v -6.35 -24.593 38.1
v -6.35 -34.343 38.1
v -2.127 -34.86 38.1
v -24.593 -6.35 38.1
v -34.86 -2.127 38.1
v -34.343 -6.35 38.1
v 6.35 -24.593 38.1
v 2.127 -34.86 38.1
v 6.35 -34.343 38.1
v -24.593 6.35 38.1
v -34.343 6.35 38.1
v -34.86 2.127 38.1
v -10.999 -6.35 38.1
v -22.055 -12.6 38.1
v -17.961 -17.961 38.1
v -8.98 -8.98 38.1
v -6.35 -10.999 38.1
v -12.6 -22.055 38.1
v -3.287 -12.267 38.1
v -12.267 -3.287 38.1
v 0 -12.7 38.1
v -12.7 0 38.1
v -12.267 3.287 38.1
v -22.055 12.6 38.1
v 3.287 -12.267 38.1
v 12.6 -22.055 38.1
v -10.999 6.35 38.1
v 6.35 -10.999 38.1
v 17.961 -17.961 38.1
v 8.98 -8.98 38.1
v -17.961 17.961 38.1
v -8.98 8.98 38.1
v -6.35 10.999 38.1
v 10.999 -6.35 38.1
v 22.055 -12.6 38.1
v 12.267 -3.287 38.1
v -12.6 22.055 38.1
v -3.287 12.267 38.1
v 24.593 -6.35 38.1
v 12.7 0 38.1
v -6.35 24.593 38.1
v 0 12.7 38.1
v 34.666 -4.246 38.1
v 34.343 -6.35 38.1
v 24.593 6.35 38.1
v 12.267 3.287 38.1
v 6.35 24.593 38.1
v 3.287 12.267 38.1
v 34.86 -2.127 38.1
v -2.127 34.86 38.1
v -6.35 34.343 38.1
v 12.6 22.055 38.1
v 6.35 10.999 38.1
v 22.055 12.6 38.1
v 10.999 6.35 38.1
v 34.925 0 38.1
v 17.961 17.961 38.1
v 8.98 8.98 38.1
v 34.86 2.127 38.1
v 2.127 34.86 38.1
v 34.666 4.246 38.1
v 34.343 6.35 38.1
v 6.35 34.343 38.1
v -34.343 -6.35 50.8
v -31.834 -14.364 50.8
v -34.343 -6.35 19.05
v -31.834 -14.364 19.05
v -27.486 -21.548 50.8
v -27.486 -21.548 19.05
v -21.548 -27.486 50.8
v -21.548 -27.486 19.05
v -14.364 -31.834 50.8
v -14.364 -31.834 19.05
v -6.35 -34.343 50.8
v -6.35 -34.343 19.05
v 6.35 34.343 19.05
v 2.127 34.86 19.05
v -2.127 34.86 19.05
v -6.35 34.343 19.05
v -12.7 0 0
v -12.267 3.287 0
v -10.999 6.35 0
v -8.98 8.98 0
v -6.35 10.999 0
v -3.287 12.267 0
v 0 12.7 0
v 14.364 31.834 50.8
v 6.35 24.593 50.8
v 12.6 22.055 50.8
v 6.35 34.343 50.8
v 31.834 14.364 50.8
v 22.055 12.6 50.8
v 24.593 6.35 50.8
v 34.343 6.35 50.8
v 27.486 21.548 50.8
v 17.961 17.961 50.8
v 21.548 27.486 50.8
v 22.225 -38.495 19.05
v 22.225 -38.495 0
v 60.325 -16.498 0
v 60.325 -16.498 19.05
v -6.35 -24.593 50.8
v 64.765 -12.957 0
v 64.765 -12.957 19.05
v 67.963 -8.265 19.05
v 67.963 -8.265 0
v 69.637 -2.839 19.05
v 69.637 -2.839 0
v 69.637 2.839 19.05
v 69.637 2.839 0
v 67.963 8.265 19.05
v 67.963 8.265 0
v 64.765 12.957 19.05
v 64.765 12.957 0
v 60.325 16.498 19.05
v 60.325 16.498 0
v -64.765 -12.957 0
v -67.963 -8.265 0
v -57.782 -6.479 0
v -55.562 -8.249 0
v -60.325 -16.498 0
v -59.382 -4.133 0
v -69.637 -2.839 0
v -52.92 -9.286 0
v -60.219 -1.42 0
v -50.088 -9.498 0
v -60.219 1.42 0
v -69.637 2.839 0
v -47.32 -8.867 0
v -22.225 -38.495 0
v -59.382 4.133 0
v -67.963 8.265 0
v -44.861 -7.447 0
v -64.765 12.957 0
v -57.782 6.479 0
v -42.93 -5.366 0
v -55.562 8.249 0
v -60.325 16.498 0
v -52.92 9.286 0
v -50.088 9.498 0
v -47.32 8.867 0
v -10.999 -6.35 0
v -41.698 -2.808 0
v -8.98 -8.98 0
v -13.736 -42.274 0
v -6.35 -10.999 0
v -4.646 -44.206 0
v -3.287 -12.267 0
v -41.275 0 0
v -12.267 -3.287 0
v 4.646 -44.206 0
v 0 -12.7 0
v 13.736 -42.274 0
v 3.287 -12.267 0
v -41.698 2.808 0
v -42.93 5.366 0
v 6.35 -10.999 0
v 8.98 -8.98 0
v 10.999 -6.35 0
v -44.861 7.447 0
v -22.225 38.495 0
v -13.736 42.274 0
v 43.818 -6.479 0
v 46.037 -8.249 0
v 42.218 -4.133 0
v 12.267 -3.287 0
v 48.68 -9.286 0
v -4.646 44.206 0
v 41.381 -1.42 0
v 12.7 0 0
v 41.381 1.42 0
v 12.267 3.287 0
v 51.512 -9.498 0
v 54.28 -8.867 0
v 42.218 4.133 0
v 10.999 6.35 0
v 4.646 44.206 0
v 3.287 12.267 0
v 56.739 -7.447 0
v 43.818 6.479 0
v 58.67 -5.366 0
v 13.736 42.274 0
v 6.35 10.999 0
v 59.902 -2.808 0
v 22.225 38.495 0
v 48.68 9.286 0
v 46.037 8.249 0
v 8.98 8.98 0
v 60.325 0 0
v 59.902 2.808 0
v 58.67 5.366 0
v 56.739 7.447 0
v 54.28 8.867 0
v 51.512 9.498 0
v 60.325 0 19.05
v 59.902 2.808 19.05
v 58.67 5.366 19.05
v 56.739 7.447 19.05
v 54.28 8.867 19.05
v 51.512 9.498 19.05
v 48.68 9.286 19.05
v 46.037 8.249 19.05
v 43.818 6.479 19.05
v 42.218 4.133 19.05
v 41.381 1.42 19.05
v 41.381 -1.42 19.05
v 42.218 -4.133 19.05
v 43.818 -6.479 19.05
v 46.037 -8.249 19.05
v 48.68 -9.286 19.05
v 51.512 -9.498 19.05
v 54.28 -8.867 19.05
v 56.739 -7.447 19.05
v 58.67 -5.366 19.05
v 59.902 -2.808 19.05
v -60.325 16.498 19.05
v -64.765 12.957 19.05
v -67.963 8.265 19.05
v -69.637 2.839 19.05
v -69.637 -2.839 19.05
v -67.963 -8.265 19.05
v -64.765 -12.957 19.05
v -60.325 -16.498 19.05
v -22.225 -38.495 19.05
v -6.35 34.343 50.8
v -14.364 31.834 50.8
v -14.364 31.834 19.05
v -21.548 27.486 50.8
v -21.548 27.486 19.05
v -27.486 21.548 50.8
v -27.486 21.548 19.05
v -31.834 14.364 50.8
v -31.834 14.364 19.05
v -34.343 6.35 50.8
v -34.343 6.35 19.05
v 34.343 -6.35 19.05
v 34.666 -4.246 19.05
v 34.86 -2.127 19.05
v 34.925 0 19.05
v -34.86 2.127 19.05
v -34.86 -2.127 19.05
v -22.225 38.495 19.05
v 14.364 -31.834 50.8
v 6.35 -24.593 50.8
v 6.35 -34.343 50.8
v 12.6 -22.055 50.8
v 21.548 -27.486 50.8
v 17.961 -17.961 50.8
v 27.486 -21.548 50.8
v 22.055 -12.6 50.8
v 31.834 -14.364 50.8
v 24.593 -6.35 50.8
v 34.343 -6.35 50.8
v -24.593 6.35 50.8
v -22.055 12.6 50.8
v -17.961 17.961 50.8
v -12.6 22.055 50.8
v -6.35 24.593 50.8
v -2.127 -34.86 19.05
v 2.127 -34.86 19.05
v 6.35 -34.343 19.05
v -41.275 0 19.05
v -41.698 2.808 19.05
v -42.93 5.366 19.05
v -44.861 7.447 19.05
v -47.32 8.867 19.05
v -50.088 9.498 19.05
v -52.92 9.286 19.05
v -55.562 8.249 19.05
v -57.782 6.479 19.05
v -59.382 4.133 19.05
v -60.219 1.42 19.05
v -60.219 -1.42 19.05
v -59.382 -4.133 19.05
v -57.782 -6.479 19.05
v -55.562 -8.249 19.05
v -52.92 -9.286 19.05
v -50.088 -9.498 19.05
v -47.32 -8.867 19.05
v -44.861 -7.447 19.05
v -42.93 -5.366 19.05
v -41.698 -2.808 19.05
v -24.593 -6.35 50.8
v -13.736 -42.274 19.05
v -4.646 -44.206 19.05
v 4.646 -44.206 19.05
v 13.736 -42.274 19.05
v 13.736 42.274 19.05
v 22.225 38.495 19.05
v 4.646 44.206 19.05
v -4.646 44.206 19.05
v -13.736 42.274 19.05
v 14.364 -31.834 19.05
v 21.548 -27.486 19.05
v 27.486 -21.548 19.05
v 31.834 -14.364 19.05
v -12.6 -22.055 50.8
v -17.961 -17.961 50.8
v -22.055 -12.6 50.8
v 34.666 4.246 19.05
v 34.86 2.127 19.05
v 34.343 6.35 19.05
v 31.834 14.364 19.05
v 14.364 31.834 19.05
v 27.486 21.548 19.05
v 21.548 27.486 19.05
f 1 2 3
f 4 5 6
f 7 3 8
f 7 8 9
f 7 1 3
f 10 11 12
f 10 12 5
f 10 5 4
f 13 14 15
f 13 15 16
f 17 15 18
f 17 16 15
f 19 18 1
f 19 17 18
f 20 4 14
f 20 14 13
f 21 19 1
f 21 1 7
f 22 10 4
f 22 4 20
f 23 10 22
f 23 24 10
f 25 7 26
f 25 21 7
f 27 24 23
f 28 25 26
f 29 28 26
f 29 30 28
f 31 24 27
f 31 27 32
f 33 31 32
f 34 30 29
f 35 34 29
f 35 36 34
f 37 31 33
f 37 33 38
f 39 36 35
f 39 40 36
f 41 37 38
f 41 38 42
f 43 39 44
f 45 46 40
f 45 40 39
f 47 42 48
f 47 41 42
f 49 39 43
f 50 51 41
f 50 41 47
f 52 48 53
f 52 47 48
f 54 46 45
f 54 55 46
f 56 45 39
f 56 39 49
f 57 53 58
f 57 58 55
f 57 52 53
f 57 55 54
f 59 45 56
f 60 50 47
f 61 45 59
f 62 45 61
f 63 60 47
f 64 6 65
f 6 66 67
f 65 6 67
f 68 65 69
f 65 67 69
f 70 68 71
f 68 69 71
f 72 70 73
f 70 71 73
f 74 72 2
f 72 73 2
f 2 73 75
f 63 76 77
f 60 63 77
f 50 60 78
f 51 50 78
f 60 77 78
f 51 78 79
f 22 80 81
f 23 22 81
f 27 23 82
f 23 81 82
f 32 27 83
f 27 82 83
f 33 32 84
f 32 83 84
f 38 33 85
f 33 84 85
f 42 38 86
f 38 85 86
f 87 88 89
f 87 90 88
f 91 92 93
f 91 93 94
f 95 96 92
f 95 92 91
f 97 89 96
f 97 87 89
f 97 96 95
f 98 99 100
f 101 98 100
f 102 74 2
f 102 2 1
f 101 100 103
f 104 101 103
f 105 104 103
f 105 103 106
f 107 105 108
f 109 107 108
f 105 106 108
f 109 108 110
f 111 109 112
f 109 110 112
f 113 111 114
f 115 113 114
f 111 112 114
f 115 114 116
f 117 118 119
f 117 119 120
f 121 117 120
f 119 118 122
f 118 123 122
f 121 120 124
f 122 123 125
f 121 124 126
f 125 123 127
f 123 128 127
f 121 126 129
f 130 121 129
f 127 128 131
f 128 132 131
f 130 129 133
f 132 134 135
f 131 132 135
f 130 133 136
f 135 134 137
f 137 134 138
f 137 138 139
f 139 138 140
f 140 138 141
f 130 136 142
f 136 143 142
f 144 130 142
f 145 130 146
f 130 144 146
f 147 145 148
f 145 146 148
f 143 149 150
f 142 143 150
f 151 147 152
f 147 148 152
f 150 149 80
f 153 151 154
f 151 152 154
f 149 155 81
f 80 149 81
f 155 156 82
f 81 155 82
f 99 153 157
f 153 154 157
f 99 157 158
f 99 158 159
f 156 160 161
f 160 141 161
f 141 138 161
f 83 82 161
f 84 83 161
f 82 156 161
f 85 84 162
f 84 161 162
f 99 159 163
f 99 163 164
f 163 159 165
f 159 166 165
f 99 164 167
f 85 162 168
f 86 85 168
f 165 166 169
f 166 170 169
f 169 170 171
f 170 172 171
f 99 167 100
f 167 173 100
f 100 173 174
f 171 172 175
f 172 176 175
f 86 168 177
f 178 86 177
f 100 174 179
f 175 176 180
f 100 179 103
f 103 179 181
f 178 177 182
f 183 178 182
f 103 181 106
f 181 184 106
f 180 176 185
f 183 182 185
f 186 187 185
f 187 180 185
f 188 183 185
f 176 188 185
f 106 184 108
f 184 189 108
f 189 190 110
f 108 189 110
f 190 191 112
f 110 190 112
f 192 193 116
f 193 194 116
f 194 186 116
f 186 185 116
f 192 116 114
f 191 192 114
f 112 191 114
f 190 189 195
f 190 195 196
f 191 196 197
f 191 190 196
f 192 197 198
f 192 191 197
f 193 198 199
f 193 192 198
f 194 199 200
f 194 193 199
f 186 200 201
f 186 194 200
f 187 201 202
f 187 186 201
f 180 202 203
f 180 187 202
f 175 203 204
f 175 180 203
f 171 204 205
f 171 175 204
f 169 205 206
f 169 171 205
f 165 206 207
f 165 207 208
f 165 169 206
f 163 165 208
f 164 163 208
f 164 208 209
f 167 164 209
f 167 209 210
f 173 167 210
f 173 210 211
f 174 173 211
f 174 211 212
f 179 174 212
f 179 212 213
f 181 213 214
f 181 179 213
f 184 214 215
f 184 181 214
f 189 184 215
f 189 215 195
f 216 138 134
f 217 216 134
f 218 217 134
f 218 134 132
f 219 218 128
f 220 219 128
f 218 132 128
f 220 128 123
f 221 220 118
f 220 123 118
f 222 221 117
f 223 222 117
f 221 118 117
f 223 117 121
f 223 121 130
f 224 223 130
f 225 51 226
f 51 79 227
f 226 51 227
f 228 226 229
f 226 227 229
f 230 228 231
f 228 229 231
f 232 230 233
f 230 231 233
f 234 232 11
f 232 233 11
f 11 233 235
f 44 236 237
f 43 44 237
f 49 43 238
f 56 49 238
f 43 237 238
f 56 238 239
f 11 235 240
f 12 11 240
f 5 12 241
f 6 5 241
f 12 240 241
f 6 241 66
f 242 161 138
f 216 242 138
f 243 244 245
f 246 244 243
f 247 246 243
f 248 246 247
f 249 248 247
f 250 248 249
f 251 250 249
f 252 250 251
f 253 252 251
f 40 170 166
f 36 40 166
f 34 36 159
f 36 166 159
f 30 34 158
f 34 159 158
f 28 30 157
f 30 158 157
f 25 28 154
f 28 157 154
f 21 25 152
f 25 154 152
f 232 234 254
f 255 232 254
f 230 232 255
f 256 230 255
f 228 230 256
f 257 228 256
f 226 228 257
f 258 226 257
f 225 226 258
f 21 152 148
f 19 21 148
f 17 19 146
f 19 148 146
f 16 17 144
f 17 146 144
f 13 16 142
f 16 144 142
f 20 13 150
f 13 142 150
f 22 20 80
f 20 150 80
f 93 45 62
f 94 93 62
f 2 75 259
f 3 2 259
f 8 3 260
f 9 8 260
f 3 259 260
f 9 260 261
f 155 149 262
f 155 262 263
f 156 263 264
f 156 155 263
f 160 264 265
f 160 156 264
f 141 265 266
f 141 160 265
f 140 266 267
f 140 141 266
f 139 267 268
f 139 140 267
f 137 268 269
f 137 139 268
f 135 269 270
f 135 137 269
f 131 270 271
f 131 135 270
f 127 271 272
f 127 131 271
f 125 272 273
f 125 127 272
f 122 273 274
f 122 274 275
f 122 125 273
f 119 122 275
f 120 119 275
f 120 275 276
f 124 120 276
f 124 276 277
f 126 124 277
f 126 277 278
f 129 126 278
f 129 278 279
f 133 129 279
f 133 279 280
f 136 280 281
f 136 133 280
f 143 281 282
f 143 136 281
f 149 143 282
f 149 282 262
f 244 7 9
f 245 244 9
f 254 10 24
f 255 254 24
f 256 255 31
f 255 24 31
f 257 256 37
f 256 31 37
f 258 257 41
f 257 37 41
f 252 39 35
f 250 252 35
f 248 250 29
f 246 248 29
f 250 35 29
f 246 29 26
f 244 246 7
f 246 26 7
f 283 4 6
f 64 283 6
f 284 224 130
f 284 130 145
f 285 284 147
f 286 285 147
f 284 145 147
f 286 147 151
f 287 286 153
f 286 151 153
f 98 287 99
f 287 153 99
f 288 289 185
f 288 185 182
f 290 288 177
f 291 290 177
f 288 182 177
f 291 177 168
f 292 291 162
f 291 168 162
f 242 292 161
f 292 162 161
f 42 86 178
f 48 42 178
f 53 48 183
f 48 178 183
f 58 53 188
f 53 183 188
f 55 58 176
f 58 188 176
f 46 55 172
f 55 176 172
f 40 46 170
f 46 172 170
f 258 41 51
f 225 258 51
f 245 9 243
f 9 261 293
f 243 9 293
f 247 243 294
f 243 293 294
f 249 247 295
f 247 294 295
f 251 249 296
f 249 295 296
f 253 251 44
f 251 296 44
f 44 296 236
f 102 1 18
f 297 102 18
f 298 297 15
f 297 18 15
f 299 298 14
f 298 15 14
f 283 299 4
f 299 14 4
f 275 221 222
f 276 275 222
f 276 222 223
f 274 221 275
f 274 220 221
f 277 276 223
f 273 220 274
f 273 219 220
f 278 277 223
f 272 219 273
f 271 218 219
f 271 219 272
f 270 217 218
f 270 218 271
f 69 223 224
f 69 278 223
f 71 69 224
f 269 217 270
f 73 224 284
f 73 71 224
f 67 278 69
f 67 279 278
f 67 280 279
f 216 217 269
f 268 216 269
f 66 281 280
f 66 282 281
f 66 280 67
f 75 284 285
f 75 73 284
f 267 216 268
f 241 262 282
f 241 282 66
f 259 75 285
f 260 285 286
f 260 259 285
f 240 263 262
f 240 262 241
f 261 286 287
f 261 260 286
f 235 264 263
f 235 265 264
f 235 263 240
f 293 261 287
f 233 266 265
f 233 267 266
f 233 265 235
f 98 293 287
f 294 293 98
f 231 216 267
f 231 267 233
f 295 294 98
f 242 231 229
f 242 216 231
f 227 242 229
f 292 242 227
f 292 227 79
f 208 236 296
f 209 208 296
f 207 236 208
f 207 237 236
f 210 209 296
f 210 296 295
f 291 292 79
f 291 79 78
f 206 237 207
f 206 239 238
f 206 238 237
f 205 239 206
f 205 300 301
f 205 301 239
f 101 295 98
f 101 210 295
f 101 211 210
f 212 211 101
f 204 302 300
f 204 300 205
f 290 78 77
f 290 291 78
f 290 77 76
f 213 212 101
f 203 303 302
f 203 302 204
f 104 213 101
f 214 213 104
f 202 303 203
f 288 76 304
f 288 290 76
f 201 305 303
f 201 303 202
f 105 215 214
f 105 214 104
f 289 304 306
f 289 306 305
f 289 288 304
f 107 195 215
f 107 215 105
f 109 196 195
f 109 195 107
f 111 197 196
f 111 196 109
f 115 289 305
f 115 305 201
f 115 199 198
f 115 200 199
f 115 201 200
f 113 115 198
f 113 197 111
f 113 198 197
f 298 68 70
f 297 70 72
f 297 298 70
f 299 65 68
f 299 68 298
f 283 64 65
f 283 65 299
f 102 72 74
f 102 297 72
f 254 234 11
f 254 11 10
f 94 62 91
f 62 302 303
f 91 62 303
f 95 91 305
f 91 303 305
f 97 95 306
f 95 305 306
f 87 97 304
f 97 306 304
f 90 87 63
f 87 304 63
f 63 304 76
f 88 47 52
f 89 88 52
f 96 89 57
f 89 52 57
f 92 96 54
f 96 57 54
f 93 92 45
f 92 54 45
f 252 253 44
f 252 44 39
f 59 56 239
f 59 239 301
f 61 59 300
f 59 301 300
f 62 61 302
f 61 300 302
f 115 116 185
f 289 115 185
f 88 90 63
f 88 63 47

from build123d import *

# Parameters (mm, degrees)
F0_R     = 9.525
F1_DEPTH = 19.05
F2_DEPTH = 50.8
F3_DEPTH = 38.1


with BuildPart() as f1:
    # F0 (on Top) → F1 (new body)
    with BuildSketch(Plane.XY):
        with BuildLine():
            Line((-60.325, -16.4977839421), (-22.225, -38.4948291982))
            ThreePointArc((-22.225, -38.4948291982), (0, -44.45), (22.225, -38.4948291982))
            Line((22.225, -38.4948291982), (60.325, -16.4977839421))
            ThreePointArc((60.325, -16.4977839421), (69.85, 0), (60.325, 16.4977839421))
            Line((60.325, 16.4977839421), (22.225, 38.4948291982))
            ThreePointArc((22.225, 38.4948291982), (0, 44.45), (-22.225, 38.4948291982))
            Line((-22.225, 38.4948291982), (-60.325, 16.4977839421))
            ThreePointArc((-60.325, 16.4977839421), (-69.85, 0), (-60.325, -16.4977839421))
        make_face()
        with Locations((-50.8, 0)):
            Circle(F0_R, mode=Mode.SUBTRACT)
        with BuildLine():
            ThreePointArc((6.35, 34.3428758988), (24.6957043329, 24.6957043329), (34.3428758988, 6.35))
            ThreePointArc((34.3428758988, 6.35), (34.7791644937, 3.1883133656), (34.925, 0))
            ThreePointArc((34.925, 0), (34.7791644937, -3.1883133656), (34.3428758988, -6.35))
            ThreePointArc((34.3428758988, -6.35), (24.6957043329, -24.6957043329), (6.35, -34.3428758988))
            ThreePointArc((6.35, -34.3428758988), (0, -34.925), (-6.35, -34.3428758988))
            ThreePointArc((-6.35, -34.3428758988), (-24.6957043329, -24.6957043329), (-34.3428758988, -6.35))
            ThreePointArc((-34.3428758988, -6.35), (-34.925, 0), (-34.3428758988, 6.35))
            ThreePointArc((-34.3428758988, 6.35), (-24.6957043329, 24.6957043329), (-6.35, 34.3428758988))
            ThreePointArc((-6.35, 34.3428758988), (0, 34.925), (6.35, 34.3428758988))
        make_face(mode=Mode.SUBTRACT)
        with Locations((50.8, 0)):
            Circle(F0_R, mode=Mode.SUBTRACT)
    extrude(amount=F1_DEPTH)

    # F0 (on Top) → F2 (join)
    with BuildSketch(Plane.XY):
        with BuildLine():
            ThreePointArc((-24.5934442484, 6.35), (-17.9605122421, 17.9605122421), (-6.35, 24.5934442484))
            Line((-6.35, 24.5934442484), (-6.35, 34.3428758988))
            ThreePointArc((-6.35, 34.3428758988), (-24.6957043329, 24.6957043329), (-34.3428758988, 6.35))
            Line((-34.3428758988, 6.35), (-30.5676609278, 6.35))
            Line((-30.5676609278, 6.35), (-24.5934442484, 6.35))
        make_face()
        with BuildLine():
            Line((-6.35, -34.3428758988), (-6.35, -24.5934442484))
            ThreePointArc((-6.35, -24.5934442484), (-17.9605122421, -17.9605122421), (-24.5934442484, -6.35))
            Line((-24.5934442484, -6.35), (-34.3428758988, -6.35))
            ThreePointArc((-34.3428758988, -6.35), (-24.6957043329, -24.6957043329), (-6.35, -34.3428758988))
        make_face()
        with BuildLine():
            Line((25.4, -6.35), (24.5934442484, -6.35))
            ThreePointArc((24.5934442484, -6.35), (17.9605122421, -17.9605122421), (6.35, -24.5934442484))
            Line((6.35, -24.5934442484), (6.35, -29.9044754356))
            Line((6.35, -29.9044754356), (6.35, -34.3428758988))
            ThreePointArc((6.35, -34.3428758988), (24.6957043329, -24.6957043329), (34.3428758988, -6.35))
            Line((34.3428758988, -6.35), (25.4, -6.35))
        make_face()
        with BuildLine():
            ThreePointArc((6.35, 24.5934442484), (17.9605122421, 17.9605122421), (24.5934442484, 6.35))
            Line((24.5934442484, 6.35), (34.3428758988, 6.35))
            ThreePointArc((34.3428758988, 6.35), (24.6957043329, 24.6957043329), (6.35, 34.3428758988))
            Line((6.35, 34.3428758988), (6.35, 25.4))
            Line((6.35, 25.4), (6.35, 24.5934442484))
        make_face()
    extrude(amount=F2_DEPTH)

    # F0 (on Top) → F3 (join)
    with BuildSketch(Plane.XY):
        with BuildLine():
            ThreePointArc((24.5934442484, -6.35), (25.1975542852, -3.2005090291), (25.4, 0))
            ThreePointArc((25.4, 0), (25.1975542852, 3.2005090291), (24.5934442484, 6.35))
            ThreePointArc((24.5934442484, 6.35), (17.9605122421, 17.9605122421), (6.35, 24.5934442484))
            ThreePointArc((6.35, 24.5934442484), (0, 25.4), (-6.35, 24.5934442484))
            ThreePointArc((-6.35, 24.5934442484), (-17.9605122421, 17.9605122421), (-24.5934442484, 6.35))
            ThreePointArc((-24.5934442484, 6.35), (-25.4, 0), (-24.5934442484, -6.35))
            ThreePointArc((-24.5934442484, -6.35), (-17.9605122421, -17.9605122421), (-6.35, -24.5934442484))
            ThreePointArc((-6.35, -24.5934442484), (0, -25.4), (6.35, -24.5934442484))
            ThreePointArc((6.35, -24.5934442484), (17.9605122421, -17.9605122421), (24.5934442484, -6.35))
        make_face()
        with BuildLine():
            ThreePointArc((0, 12.7), (8.9802561211, 8.9802561211), (12.7, 0))
            ThreePointArc((12.7, 0), (8.9802561211, -8.9802561211), (0, -12.7))
            ThreePointArc((0, -12.7), (-8.9802561211, -8.9802561211), (-12.7, 0))
            ThreePointArc((-12.7, 0), (-8.9802561211, 8.9802561211), (0, 12.7))
        make_face(mode=Mode.SUBTRACT)
        with BuildLine():
            ThreePointArc((24.5934442484, 6.35), (25.1975542852, 3.2005090291), (25.4, 0))
            ThreePointArc((25.4, 0), (25.1975542852, -3.2005090291), (24.5934442484, -6.35))
            Line((24.5934442484, -6.35), (25.4, -6.35))
            Line((25.4, -6.35), (34.3428758988, -6.35))
            ThreePointArc((34.3428758988, -6.35), (34.7791644937, -3.1883133656), (34.925, 0))
            ThreePointArc((34.925, 0), (34.7791644937, 3.1883133656), (34.3428758988, 6.35))
            Line((34.3428758988, 6.35), (24.5934442484, 6.35))
        make_face()
        with BuildLine():
            ThreePointArc((-6.35, 24.5934442484), (0, 25.4), (6.35, 24.5934442484))
            Line((6.35, 24.5934442484), (6.35, 25.4))
            Line((6.35, 25.4), (6.35, 34.3428758988))
            ThreePointArc((6.35, 34.3428758988), (0, 34.925), (-6.35, 34.3428758988))
            Line((-6.35, 34.3428758988), (-6.35, 24.5934442484))
        make_face()
        with BuildLine():
            Line((6.35, -29.9044754356), (6.35, -24.5934442484))
            ThreePointArc((6.35, -24.5934442484), (0, -25.4), (-6.35, -24.5934442484))
            Line((-6.35, -24.5934442484), (-6.35, -34.3428758988))
            ThreePointArc((-6.35, -34.3428758988), (0, -34.925), (6.35, -34.3428758988))
            Line((6.35, -34.3428758988), (6.35, -29.9044754356))
        make_face()
        with BuildLine():
            ThreePointArc((-24.5934442484, -6.35), (-25.4, 0), (-24.5934442484, 6.35))
            Line((-24.5934442484, 6.35), (-30.5676609278, 6.35))
            Line((-30.5676609278, 6.35), (-34.3428758988, 6.35))
            ThreePointArc((-34.3428758988, 6.35), (-34.925, 0), (-34.3428758988, -6.35))
            Line((-34.3428758988, -6.35), (-24.5934442484, -6.35))
        make_face()
    extrude(amount=F3_DEPTH)


solid = f1.part
